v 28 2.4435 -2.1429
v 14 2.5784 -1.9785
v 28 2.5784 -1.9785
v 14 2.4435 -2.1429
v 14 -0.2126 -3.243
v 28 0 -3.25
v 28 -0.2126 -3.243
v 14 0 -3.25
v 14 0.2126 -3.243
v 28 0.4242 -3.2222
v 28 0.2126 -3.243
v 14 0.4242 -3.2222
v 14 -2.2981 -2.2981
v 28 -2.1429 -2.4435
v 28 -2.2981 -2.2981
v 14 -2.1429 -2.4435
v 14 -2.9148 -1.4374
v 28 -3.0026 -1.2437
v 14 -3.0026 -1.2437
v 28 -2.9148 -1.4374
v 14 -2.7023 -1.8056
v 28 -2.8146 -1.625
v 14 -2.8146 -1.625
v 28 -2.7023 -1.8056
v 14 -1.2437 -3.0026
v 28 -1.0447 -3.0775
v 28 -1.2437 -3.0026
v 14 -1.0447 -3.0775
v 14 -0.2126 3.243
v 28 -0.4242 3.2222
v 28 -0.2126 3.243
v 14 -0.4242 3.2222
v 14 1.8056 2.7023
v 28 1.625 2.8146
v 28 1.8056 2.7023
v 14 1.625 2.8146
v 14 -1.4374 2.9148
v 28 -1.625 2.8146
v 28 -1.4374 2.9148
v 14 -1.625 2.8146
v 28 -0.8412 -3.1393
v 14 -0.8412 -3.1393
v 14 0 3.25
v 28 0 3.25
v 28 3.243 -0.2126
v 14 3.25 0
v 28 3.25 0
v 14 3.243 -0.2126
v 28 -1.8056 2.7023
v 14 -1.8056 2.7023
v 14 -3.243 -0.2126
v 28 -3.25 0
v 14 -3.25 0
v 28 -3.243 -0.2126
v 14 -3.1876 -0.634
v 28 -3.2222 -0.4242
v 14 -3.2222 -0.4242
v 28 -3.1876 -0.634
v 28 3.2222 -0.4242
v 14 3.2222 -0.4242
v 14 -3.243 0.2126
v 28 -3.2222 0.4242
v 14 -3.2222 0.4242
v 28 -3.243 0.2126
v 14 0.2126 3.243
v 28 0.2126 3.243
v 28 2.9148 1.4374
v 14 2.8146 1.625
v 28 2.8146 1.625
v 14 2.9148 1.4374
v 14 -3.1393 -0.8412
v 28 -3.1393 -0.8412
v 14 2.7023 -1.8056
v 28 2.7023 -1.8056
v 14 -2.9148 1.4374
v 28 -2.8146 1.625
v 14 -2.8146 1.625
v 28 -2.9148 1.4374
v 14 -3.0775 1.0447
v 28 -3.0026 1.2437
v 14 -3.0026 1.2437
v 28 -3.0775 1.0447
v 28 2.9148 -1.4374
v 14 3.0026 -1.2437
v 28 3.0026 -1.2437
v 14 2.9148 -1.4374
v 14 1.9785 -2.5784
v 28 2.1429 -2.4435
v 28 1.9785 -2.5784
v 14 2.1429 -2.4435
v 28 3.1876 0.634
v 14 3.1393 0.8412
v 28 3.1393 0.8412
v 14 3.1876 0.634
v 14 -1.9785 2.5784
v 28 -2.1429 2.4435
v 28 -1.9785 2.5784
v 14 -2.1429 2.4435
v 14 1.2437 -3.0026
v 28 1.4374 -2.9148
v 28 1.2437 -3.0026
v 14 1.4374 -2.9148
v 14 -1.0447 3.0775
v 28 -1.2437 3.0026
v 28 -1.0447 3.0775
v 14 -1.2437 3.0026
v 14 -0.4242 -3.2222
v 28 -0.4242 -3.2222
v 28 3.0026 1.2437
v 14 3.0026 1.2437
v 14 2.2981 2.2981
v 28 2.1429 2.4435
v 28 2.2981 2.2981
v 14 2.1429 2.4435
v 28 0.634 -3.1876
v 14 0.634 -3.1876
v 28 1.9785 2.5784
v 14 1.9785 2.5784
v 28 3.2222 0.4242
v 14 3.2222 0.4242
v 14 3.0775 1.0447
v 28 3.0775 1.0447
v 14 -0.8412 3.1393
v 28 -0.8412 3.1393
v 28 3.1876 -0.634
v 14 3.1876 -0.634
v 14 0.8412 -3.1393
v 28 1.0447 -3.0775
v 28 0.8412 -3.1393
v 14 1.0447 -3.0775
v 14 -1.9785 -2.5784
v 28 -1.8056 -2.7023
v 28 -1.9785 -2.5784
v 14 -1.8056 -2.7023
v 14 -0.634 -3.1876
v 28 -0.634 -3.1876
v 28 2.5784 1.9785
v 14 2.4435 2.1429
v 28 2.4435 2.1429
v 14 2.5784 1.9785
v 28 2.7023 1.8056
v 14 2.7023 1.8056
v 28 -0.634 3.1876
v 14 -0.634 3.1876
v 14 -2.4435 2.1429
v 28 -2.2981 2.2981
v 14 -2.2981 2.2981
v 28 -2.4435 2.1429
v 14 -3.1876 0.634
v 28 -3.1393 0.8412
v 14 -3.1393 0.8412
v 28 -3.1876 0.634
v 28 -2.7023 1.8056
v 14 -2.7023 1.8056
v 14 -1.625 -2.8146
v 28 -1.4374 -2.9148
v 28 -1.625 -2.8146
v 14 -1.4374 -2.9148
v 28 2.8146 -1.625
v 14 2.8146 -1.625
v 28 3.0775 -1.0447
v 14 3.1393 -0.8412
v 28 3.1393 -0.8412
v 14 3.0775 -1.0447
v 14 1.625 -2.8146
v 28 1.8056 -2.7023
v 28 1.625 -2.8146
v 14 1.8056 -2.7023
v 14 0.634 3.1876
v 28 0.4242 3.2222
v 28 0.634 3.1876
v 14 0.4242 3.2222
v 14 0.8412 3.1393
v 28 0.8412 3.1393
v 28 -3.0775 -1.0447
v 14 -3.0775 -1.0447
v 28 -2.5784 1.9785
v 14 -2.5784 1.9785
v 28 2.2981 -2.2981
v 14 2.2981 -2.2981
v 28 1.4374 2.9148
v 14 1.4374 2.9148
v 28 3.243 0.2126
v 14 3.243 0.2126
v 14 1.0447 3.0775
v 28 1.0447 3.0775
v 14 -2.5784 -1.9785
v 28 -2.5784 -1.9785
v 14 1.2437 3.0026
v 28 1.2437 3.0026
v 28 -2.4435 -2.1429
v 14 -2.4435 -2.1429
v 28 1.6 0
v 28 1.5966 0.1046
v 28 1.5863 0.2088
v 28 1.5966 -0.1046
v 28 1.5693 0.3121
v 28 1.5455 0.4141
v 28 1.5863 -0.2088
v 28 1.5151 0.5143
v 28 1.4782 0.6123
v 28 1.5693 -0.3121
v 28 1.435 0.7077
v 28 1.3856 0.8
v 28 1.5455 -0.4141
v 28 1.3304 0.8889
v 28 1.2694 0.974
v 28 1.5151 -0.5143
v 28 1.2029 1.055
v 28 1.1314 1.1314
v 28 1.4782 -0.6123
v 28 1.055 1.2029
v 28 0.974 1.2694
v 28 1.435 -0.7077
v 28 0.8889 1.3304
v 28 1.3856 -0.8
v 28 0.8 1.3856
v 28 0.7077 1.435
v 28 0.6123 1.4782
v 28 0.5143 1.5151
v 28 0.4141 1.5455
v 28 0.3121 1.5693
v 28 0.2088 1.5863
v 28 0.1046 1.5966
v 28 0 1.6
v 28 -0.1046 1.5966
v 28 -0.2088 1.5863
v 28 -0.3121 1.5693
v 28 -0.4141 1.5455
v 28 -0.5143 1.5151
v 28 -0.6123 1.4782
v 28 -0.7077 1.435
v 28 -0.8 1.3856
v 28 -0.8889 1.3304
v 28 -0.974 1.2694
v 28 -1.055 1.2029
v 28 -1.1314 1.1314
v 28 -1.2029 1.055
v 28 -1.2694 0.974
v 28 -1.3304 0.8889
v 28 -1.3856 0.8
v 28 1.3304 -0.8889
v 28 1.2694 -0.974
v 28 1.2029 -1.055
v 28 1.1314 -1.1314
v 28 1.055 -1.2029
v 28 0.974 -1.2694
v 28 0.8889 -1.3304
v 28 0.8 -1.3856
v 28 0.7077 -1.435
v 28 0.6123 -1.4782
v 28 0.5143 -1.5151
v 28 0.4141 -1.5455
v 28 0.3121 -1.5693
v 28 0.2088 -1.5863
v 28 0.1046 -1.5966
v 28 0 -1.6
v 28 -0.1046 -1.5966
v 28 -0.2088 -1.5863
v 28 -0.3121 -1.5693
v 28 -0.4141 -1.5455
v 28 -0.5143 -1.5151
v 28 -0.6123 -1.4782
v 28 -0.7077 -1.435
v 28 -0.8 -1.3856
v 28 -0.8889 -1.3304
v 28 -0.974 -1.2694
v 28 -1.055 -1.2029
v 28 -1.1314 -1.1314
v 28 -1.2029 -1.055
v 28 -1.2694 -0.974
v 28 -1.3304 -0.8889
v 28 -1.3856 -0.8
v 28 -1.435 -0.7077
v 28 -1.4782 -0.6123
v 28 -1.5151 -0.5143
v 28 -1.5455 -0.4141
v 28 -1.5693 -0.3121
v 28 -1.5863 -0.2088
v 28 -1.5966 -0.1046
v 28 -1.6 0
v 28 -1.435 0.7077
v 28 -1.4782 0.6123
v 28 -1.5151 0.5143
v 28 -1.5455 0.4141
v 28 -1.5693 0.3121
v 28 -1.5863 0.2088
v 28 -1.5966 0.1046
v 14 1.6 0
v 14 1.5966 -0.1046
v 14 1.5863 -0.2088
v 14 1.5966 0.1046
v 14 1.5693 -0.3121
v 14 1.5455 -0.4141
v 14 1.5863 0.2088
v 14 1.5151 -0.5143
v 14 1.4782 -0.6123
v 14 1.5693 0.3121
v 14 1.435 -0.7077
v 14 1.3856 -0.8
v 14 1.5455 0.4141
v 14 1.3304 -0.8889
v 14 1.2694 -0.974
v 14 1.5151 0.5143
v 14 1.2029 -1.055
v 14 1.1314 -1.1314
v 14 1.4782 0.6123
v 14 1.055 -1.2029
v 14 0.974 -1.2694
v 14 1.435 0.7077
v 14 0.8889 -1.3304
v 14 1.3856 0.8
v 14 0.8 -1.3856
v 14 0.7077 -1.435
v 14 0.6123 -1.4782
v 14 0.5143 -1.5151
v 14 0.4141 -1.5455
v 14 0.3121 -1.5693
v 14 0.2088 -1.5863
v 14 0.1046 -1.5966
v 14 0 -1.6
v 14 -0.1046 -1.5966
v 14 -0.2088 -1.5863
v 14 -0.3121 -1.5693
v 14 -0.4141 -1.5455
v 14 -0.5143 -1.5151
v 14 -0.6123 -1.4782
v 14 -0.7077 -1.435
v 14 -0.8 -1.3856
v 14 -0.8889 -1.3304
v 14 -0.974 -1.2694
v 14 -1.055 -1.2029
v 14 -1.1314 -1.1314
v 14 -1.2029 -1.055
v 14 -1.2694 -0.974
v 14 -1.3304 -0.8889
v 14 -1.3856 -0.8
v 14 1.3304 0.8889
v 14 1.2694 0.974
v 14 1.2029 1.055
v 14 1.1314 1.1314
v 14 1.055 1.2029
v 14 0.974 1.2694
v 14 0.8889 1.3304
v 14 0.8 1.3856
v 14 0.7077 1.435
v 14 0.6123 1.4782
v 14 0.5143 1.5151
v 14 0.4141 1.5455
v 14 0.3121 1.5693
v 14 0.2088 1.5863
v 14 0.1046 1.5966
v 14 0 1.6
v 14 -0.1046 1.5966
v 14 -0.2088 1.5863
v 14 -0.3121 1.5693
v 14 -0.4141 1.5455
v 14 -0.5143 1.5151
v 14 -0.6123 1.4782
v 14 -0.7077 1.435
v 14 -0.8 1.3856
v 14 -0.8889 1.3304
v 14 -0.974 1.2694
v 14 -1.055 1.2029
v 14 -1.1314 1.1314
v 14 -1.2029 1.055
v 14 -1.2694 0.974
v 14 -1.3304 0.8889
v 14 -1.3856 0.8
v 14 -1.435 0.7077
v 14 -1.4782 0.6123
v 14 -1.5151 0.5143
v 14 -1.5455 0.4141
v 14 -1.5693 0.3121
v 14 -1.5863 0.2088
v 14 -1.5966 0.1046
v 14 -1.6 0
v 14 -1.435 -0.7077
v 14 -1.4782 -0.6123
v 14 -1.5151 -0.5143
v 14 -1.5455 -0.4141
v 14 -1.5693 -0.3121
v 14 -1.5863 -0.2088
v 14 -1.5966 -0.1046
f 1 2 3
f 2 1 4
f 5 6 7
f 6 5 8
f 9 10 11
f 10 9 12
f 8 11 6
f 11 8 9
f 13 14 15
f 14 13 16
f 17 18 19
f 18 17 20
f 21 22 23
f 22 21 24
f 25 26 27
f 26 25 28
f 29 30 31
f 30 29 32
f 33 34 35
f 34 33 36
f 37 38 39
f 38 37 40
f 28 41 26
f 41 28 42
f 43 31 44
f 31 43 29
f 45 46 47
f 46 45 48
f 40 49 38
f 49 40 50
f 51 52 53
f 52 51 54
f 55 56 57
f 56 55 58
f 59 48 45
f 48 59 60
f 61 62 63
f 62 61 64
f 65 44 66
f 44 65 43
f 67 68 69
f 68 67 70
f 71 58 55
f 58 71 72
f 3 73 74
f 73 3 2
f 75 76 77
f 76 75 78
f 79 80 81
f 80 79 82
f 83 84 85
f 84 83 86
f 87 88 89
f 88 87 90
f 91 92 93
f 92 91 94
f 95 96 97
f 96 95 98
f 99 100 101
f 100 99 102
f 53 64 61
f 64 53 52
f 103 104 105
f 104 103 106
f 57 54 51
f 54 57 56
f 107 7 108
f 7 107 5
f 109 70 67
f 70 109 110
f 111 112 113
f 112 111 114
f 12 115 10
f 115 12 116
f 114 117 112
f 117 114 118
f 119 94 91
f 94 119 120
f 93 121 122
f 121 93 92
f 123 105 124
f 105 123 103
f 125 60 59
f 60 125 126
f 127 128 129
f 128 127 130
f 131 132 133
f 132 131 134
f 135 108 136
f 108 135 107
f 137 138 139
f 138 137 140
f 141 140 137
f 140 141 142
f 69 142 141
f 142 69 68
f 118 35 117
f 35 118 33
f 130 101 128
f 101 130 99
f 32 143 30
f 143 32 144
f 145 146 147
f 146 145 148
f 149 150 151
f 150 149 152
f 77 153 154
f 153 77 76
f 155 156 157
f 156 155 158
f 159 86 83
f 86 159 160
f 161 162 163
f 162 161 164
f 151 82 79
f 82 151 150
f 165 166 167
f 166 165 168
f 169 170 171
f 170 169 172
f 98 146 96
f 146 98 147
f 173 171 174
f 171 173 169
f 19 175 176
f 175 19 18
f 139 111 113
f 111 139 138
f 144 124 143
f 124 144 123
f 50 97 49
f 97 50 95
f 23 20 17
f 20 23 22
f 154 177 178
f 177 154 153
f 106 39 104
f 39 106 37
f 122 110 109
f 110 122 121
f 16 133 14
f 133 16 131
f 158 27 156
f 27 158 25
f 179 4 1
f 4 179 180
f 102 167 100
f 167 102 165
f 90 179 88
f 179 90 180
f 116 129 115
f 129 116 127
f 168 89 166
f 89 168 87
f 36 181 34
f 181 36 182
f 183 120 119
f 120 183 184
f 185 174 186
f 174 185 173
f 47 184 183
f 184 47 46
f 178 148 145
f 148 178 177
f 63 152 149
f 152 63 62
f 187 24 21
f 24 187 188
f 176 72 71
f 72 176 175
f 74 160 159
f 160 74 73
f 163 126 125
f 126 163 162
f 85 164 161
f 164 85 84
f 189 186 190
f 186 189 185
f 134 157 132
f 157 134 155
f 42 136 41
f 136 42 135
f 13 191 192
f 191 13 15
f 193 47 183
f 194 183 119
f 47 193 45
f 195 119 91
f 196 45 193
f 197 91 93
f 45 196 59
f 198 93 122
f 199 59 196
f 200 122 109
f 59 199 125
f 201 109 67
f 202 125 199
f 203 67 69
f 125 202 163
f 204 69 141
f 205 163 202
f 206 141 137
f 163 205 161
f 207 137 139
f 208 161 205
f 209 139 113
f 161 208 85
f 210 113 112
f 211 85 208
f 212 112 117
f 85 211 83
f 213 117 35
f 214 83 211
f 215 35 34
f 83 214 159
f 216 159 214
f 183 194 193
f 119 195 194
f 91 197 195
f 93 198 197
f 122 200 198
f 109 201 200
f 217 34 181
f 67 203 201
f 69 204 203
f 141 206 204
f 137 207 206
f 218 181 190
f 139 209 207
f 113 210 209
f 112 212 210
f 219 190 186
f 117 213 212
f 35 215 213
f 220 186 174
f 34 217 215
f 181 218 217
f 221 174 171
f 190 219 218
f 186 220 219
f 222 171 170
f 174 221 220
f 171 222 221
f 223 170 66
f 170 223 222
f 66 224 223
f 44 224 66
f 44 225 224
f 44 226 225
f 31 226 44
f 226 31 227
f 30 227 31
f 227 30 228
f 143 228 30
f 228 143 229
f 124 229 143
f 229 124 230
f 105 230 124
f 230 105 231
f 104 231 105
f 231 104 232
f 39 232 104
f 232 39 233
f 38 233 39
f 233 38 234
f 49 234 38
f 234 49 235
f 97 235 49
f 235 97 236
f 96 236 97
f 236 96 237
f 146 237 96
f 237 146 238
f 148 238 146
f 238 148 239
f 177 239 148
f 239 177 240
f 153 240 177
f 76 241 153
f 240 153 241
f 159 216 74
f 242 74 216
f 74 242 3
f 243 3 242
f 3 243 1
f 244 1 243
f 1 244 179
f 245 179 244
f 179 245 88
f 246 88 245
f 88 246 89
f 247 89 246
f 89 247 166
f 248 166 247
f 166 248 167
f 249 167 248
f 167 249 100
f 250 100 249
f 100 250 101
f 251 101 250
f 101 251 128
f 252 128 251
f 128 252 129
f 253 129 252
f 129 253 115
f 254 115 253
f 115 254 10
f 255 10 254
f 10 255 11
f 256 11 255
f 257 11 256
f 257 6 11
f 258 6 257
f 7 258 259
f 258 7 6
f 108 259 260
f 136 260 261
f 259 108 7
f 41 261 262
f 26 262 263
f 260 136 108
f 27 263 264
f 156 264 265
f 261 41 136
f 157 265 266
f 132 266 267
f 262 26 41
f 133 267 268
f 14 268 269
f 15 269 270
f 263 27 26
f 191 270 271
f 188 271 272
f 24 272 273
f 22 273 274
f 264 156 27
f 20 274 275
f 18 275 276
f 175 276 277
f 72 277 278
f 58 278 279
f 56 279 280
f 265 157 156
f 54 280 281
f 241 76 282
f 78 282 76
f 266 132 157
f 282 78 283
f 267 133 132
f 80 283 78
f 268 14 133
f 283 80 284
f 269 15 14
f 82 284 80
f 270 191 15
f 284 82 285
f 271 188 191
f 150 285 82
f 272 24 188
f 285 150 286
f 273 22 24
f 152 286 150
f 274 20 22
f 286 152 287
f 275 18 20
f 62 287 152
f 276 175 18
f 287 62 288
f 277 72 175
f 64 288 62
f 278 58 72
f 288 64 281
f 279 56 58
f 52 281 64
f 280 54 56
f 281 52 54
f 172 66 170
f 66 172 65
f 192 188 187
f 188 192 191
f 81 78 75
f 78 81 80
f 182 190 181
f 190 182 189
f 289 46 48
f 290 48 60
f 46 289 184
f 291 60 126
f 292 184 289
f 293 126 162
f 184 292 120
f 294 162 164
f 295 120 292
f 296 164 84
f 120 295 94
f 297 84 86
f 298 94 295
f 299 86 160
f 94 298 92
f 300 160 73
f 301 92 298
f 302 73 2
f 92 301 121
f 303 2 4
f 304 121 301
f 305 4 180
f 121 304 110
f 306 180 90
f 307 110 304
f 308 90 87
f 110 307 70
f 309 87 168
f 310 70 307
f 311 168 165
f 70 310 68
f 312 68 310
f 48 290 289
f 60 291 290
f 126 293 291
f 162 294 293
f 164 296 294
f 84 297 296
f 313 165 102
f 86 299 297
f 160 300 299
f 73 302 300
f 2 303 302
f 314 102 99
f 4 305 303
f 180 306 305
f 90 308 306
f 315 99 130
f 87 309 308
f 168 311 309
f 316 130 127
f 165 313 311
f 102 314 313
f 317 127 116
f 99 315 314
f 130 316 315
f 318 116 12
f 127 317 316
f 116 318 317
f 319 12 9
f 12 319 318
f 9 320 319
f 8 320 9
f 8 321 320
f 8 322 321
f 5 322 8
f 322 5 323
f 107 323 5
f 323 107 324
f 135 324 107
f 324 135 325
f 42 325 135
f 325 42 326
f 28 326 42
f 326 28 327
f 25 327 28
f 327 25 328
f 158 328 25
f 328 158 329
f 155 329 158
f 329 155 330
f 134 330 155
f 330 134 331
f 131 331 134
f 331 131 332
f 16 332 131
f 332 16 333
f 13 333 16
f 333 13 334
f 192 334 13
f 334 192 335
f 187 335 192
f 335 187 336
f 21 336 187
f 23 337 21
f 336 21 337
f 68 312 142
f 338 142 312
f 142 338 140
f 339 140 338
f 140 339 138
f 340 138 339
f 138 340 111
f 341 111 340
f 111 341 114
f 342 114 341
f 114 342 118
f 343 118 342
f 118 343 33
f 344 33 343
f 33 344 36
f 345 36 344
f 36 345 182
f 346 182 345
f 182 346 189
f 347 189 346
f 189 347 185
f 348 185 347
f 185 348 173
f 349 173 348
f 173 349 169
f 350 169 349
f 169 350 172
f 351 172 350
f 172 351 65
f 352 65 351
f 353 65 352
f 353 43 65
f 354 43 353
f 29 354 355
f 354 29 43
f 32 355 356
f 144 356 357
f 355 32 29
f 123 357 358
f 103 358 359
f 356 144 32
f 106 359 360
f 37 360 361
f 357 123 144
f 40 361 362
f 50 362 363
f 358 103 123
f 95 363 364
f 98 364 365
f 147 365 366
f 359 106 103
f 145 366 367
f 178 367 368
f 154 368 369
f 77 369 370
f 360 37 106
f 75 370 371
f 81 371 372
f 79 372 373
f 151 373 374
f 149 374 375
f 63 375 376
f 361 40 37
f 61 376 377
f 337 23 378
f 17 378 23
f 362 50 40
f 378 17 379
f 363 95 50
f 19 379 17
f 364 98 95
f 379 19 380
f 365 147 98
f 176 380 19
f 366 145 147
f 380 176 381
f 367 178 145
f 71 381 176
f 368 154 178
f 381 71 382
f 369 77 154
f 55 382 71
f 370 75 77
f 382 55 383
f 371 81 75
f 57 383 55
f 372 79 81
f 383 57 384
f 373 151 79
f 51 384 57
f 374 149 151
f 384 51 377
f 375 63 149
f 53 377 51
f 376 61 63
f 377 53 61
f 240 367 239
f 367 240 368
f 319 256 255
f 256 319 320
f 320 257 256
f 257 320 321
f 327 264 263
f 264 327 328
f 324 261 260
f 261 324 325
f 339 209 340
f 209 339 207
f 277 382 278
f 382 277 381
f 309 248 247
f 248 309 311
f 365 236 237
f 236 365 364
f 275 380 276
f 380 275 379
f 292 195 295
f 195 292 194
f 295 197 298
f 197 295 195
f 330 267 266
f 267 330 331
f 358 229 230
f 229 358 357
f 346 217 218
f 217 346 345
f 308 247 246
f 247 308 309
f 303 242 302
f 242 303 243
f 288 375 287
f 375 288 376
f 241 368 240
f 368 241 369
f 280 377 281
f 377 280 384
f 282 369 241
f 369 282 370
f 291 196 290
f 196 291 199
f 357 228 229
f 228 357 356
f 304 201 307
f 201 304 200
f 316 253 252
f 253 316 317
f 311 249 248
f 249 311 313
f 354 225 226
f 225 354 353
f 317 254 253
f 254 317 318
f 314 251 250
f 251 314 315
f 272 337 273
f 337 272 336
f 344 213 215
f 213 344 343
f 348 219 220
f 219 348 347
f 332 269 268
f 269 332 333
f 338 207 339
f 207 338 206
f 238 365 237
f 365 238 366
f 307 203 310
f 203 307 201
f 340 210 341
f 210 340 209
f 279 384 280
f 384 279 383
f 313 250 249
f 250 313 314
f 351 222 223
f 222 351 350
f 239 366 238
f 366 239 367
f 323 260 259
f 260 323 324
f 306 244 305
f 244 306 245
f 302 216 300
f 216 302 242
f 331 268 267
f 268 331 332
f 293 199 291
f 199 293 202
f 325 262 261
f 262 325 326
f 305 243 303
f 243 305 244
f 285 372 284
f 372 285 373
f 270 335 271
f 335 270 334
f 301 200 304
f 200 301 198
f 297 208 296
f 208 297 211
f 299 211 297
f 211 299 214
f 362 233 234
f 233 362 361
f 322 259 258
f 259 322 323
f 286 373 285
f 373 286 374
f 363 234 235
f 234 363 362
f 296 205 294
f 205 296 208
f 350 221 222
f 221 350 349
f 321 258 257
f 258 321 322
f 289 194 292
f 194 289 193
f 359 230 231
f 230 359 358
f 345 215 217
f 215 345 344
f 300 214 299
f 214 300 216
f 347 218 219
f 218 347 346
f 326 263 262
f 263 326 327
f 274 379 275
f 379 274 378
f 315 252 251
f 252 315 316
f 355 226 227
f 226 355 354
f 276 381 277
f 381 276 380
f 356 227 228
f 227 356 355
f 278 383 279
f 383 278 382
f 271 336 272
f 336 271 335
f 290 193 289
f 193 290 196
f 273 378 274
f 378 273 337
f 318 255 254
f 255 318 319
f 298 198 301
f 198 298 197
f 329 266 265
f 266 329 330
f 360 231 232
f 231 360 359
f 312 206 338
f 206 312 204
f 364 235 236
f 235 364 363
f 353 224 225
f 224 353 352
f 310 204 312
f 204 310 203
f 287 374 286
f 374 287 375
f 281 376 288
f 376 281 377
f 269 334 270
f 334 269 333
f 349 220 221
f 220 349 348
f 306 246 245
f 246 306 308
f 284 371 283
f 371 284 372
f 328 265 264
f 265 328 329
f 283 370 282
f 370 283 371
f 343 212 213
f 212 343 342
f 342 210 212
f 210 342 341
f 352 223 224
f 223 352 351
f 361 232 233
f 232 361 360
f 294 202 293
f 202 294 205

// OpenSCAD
$fn=96;

module ring_terminal(
    ring_od=16,
    ring_id=8,
    ring_th=2.2,
    neck_w=6,
    neck_l=6,
    barrel_od=6.5,
    barrel_id=3.2,
    barrel_l=14,
    barrel_wall=1.2
){
    union(){
        // Ring + neck (flat)
        linear_extrude(height=ring_th, center=true)
        union(){
            difference(){
                circle(d=ring_od);
                circle(d=ring_id);
            }
            translate([ring_od/2 + neck_l/2, 0])
                square([neck_l, neck_w], center=true);
        }

        // Barrel (tube) aligned along +X, centered in Z
        translate([ring_od/2 + neck_l + barrel_l/2, 0, 0])
        rotate([0,90,0])
        difference(){
            cylinder(d=barrel_od, h=barrel_l, center=true);
            cylinder(d=barrel_id, h=barrel_l + 0.6, center=true);
        }

        // Transition collar between neck and barrel
        translate([ring_od/2 + neck_l + 1.2, 0, 0])
        rotate([0,90,0])
        difference(){
            cylinder(d1=barrel_od, d2=barrel_od*0.92, h=2.4, center=true);
            cylinder(d=barrel_id, h=3.2, center=true);
        }
    }
}

ring_terminal();
